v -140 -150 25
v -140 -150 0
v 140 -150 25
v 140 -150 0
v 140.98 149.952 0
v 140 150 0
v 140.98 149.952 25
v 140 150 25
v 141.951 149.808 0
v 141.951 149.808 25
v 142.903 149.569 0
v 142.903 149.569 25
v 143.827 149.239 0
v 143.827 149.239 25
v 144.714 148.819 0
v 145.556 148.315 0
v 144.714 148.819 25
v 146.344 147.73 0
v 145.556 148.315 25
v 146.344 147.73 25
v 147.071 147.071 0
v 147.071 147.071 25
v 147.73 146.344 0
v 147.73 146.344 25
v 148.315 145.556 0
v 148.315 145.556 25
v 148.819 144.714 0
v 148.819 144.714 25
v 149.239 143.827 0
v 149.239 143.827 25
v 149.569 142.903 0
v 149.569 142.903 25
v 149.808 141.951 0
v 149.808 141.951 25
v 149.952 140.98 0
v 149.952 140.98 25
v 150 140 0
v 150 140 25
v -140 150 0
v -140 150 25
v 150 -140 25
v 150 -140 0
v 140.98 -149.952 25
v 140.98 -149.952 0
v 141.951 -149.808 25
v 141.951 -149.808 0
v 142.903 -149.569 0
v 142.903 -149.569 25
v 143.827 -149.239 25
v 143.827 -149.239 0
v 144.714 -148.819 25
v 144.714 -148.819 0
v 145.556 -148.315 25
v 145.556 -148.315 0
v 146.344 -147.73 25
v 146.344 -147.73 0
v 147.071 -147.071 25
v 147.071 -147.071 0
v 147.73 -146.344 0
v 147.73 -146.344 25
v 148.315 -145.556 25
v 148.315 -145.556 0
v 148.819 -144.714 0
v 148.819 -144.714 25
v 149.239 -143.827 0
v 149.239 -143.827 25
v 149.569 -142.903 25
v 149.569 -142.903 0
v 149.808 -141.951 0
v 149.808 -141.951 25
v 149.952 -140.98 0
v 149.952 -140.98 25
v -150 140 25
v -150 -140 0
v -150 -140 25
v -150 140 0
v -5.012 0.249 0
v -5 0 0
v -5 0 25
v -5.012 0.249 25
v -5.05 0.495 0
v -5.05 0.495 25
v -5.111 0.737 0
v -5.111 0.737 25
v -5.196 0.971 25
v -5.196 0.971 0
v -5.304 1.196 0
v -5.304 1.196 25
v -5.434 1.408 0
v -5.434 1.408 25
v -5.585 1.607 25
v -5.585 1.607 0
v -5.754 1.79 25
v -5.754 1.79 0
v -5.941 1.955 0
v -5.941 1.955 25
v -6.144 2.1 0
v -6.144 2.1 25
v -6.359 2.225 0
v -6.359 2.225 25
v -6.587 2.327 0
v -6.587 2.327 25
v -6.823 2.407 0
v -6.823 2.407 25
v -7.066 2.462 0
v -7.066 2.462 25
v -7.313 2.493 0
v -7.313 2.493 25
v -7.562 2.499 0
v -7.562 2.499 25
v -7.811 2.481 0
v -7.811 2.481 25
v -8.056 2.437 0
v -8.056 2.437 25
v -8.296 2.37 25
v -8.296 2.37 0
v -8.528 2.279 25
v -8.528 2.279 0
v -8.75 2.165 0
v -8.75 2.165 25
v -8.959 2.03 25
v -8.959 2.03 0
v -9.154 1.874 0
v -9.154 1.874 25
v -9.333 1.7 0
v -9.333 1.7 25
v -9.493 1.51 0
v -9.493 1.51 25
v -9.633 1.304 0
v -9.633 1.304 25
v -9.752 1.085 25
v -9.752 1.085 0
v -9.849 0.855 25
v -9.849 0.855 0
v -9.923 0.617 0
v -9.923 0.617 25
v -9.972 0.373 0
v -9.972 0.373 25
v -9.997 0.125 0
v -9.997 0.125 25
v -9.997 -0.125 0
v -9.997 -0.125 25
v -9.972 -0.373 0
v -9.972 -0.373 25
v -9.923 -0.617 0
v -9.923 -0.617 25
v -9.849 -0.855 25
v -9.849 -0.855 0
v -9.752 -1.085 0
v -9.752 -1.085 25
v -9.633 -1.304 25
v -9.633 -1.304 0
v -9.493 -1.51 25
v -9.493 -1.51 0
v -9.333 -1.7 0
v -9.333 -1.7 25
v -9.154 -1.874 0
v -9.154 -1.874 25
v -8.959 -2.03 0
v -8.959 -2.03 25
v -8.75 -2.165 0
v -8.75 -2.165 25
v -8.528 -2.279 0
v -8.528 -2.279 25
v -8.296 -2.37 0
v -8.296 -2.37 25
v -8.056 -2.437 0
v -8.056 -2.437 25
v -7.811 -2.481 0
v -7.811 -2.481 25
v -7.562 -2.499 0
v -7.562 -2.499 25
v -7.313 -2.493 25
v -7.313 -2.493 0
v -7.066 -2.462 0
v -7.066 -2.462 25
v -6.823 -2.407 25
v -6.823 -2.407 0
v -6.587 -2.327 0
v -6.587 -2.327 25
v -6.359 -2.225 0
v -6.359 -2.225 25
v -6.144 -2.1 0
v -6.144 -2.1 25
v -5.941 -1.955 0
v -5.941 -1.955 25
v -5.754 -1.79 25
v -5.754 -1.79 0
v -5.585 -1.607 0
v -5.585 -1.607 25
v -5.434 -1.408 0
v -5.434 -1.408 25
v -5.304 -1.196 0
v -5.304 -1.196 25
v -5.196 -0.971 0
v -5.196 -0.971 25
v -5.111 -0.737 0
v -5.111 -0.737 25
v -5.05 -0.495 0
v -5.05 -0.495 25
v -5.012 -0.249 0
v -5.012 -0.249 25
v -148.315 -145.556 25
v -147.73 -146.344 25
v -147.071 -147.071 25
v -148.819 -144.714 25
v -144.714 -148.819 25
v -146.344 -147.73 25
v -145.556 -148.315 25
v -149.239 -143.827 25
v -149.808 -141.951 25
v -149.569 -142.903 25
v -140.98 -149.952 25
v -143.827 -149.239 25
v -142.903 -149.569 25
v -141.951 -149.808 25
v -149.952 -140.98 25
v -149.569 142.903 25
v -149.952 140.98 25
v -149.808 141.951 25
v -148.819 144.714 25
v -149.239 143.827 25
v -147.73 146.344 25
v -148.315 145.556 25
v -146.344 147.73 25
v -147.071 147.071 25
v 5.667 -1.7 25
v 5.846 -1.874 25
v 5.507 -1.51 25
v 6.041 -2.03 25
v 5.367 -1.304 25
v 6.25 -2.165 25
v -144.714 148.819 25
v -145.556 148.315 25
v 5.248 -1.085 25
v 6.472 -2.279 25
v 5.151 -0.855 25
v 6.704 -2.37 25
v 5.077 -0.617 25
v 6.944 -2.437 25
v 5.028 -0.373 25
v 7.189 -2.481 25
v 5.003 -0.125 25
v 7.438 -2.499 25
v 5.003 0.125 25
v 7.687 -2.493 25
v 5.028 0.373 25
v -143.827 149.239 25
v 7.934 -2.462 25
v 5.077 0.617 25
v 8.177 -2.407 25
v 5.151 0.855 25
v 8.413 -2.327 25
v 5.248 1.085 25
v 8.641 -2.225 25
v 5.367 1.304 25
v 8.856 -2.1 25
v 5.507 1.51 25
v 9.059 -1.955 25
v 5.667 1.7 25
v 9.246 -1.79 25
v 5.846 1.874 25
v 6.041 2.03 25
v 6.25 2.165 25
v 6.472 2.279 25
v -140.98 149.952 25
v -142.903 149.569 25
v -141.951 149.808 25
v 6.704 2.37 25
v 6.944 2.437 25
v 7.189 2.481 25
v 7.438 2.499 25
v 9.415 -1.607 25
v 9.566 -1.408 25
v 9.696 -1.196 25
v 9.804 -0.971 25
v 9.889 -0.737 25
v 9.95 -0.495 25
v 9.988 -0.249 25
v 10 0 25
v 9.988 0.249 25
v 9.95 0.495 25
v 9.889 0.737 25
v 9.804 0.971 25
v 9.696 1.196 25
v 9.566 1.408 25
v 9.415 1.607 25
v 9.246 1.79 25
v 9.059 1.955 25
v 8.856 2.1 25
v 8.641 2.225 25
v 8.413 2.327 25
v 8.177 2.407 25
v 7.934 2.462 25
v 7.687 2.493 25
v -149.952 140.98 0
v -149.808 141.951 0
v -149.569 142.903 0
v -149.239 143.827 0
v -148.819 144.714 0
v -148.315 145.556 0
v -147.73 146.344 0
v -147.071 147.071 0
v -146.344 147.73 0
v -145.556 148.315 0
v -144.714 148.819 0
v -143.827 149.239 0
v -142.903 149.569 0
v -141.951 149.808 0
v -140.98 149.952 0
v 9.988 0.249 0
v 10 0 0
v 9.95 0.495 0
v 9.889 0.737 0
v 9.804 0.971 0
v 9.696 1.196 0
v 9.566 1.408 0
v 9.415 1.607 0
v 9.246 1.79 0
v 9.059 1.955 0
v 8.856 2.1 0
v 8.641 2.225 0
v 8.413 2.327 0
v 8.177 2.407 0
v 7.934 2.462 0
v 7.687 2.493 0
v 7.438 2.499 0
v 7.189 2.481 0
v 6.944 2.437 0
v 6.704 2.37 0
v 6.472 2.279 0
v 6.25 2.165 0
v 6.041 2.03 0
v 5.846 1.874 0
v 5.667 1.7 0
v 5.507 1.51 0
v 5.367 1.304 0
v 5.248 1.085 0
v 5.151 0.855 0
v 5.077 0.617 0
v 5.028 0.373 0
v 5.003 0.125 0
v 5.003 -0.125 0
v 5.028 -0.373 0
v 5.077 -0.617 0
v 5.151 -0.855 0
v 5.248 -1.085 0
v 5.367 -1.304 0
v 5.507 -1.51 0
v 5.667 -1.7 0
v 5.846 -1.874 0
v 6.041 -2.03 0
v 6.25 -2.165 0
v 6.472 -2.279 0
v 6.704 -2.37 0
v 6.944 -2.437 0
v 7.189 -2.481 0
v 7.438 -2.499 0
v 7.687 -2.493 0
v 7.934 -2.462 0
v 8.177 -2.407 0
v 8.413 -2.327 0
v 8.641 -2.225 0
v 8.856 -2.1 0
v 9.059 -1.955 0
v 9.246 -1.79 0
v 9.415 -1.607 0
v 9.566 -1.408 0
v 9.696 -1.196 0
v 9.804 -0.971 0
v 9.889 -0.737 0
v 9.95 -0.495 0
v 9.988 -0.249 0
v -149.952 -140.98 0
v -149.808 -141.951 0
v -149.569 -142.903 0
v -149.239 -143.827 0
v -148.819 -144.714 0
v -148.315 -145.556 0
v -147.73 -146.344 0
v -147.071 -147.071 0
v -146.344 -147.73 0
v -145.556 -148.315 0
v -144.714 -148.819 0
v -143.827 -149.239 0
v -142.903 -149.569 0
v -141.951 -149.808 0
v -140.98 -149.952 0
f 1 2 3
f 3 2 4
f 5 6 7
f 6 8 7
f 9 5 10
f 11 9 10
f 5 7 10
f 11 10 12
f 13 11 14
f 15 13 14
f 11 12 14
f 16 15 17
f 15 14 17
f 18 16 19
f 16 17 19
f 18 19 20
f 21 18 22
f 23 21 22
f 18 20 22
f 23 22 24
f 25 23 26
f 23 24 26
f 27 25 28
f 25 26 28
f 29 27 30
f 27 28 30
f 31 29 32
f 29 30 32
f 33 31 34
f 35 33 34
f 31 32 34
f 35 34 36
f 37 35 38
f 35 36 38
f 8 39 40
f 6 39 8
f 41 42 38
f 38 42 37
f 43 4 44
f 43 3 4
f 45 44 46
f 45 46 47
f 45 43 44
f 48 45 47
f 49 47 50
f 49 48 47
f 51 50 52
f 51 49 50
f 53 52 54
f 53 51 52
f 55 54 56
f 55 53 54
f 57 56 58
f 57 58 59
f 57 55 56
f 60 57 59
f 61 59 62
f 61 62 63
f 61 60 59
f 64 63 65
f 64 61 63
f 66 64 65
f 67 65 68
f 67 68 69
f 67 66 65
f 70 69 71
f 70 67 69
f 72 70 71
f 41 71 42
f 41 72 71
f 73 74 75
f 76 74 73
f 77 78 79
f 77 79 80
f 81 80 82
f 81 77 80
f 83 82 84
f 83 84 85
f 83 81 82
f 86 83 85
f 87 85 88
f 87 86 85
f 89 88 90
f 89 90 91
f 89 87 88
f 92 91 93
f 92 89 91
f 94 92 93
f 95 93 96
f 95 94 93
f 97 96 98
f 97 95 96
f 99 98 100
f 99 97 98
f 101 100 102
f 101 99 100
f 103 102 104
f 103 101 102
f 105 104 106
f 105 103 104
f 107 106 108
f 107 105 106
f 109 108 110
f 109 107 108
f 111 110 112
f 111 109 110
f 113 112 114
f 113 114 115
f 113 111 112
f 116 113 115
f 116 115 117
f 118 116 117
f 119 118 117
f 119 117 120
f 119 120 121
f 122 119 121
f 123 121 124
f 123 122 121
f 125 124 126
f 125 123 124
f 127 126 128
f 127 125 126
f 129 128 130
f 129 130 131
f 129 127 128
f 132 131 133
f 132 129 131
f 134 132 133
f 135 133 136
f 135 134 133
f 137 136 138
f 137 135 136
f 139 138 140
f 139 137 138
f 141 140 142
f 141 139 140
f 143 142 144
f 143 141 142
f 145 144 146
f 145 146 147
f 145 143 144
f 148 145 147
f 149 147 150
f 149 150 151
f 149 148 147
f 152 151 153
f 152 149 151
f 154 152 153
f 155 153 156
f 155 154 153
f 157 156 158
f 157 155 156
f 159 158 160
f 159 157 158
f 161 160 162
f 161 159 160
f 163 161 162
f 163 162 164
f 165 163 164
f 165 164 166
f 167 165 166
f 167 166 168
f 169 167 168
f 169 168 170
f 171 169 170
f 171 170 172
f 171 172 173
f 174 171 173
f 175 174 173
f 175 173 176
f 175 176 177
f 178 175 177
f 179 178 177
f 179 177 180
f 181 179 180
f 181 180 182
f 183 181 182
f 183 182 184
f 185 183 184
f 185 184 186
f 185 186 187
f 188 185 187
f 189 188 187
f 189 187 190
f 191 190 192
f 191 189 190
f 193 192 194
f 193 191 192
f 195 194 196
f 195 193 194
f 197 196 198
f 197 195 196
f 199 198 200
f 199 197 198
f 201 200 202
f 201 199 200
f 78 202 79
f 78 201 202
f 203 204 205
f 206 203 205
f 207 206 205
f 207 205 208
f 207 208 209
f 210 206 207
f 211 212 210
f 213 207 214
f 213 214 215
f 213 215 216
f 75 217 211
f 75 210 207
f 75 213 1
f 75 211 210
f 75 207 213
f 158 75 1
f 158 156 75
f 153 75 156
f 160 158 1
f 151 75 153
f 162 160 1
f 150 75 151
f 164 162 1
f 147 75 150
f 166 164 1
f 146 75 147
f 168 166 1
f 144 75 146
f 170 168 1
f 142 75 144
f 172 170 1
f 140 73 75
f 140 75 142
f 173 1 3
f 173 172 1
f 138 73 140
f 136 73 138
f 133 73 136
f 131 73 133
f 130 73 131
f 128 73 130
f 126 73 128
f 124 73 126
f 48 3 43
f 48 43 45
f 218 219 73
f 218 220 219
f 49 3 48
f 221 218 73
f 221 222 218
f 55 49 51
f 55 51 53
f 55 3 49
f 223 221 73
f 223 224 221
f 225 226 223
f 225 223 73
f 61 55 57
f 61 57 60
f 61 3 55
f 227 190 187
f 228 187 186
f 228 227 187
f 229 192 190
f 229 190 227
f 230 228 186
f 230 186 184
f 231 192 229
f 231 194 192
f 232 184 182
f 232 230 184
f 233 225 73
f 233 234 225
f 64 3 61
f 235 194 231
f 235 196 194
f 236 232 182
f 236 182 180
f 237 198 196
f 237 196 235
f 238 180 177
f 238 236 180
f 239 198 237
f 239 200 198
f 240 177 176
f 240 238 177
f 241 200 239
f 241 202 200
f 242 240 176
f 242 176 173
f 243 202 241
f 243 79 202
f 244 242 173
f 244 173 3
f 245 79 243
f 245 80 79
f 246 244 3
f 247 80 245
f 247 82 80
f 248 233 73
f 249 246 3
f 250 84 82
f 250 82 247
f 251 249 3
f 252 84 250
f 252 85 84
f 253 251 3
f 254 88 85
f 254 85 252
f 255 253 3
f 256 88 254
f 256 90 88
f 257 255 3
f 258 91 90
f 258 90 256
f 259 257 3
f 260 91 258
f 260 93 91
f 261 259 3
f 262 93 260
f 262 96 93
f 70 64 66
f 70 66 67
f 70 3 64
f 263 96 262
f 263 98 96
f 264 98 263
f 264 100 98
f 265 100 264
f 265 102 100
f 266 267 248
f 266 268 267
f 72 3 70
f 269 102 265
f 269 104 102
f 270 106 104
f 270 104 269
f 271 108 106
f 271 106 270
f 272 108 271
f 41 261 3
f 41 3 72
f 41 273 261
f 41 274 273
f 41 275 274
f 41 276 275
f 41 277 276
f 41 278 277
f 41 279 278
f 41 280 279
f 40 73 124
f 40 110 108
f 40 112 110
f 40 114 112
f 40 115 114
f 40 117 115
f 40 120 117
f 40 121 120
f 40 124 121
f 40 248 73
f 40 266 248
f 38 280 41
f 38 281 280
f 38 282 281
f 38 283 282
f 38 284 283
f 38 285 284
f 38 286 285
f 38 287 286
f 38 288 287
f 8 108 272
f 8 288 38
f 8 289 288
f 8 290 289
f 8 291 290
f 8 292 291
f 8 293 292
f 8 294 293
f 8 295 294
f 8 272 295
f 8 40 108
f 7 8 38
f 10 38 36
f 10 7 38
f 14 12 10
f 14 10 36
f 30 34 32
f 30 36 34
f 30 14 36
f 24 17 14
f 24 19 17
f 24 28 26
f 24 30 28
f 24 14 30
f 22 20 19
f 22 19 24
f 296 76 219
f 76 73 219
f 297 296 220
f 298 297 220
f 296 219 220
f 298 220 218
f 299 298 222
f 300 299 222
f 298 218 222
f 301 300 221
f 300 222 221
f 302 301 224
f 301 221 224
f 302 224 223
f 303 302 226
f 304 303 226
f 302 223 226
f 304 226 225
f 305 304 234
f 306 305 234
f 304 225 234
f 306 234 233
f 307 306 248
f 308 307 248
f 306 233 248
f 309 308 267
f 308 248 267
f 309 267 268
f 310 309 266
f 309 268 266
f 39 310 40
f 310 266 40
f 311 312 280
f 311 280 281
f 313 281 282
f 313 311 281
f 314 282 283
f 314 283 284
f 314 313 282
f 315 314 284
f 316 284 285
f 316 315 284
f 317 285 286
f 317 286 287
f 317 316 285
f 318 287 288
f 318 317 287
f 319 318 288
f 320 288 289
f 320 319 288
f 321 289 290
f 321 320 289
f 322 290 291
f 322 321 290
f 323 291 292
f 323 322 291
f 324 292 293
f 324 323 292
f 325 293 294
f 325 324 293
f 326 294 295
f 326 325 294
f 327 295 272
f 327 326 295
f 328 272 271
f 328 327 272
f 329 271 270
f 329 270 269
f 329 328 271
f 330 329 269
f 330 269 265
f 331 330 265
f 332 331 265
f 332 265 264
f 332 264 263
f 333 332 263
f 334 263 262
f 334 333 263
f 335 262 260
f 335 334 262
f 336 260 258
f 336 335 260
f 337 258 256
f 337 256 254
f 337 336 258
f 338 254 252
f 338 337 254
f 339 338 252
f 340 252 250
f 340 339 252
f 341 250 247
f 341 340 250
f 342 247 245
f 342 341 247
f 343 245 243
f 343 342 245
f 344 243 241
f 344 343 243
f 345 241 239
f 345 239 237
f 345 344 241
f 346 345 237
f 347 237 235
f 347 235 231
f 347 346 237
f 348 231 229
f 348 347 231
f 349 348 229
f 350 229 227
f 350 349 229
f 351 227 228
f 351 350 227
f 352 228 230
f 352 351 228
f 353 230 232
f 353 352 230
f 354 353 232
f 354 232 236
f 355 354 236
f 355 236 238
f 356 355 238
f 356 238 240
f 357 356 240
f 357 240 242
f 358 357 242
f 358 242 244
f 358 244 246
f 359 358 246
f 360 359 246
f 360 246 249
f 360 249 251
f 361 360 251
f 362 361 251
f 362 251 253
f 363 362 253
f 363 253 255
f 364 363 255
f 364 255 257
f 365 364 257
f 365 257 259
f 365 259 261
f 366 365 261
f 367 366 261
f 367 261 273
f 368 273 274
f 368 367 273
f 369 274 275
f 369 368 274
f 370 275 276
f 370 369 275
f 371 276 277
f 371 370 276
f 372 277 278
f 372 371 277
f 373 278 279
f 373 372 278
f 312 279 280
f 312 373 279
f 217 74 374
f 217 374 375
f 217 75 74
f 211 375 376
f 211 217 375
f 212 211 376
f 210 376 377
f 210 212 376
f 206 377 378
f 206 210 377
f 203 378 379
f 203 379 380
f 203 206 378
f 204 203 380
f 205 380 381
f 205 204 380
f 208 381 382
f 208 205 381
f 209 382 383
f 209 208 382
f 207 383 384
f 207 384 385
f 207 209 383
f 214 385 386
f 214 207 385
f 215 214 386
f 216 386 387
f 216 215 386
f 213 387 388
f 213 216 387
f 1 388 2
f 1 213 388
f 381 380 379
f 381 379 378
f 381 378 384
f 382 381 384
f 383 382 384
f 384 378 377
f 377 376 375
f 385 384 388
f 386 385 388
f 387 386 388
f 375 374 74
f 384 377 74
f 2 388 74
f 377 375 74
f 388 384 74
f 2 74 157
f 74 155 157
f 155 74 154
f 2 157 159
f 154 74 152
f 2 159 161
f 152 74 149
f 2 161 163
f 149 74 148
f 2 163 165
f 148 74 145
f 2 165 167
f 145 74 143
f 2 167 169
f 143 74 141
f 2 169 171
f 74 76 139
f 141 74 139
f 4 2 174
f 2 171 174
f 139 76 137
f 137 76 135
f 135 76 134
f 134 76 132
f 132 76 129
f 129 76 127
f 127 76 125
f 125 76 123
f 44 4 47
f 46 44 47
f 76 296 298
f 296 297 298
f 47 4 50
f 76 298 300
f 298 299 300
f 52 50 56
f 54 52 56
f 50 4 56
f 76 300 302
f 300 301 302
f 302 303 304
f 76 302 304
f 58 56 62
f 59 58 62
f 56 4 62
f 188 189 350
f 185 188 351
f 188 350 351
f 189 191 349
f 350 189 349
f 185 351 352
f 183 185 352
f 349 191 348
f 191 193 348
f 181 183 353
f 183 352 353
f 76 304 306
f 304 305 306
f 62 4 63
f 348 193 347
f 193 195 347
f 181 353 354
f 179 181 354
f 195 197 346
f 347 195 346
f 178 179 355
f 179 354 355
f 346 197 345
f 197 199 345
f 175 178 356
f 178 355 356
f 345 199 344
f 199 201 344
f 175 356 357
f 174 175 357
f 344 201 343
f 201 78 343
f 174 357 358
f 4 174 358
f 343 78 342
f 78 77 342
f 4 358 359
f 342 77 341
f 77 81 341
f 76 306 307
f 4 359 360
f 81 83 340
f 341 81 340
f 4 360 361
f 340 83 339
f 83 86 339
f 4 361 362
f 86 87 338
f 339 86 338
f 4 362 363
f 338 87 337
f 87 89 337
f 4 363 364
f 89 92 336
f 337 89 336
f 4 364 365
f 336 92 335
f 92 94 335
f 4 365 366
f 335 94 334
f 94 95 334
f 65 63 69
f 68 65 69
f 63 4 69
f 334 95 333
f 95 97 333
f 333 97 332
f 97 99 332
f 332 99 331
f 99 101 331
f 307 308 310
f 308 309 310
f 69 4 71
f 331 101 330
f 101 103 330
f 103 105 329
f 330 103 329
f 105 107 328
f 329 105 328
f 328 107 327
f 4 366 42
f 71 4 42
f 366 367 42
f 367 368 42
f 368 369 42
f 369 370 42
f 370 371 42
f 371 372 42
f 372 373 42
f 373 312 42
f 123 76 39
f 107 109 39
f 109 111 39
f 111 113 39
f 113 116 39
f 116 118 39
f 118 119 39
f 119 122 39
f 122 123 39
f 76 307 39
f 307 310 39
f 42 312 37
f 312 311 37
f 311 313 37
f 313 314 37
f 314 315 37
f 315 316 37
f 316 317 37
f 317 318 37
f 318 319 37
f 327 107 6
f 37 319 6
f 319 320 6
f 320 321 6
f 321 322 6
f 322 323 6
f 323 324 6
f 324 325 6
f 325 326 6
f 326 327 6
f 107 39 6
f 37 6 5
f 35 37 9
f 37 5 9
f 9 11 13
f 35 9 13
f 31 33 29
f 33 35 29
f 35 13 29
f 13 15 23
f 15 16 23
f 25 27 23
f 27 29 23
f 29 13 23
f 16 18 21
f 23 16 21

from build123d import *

# Parameters (mm, degrees)
F0_W     = 300
F0_H     = 300
F0_R     = 2.5
F1_DEPTH = 25
F2_R     = 10


with BuildPart() as f1:
    # F0 (on Top) → F1 (new body)
    with BuildSketch(Plane.XY):
        Rectangle(F0_W, F0_H)
        with Locations((-7.5, 0)):
            Circle(F0_R, mode=Mode.SUBTRACT)
        with Locations((7.5, 0)):
            Circle(F0_R, mode=Mode.SUBTRACT)
    extrude(amount=F1_DEPTH)

    # F2
    f2_edges = [f1.edges().sort_by_distance(p)[0] for p in [
        (150, 150, 12.5),
        (-150, 150, 12.5),
        (150, -150, 12.5),
        (-150, -150, 12.5),
    ]]
    fillet(f2_edges, radius=F2_R)


solid = f1.part
